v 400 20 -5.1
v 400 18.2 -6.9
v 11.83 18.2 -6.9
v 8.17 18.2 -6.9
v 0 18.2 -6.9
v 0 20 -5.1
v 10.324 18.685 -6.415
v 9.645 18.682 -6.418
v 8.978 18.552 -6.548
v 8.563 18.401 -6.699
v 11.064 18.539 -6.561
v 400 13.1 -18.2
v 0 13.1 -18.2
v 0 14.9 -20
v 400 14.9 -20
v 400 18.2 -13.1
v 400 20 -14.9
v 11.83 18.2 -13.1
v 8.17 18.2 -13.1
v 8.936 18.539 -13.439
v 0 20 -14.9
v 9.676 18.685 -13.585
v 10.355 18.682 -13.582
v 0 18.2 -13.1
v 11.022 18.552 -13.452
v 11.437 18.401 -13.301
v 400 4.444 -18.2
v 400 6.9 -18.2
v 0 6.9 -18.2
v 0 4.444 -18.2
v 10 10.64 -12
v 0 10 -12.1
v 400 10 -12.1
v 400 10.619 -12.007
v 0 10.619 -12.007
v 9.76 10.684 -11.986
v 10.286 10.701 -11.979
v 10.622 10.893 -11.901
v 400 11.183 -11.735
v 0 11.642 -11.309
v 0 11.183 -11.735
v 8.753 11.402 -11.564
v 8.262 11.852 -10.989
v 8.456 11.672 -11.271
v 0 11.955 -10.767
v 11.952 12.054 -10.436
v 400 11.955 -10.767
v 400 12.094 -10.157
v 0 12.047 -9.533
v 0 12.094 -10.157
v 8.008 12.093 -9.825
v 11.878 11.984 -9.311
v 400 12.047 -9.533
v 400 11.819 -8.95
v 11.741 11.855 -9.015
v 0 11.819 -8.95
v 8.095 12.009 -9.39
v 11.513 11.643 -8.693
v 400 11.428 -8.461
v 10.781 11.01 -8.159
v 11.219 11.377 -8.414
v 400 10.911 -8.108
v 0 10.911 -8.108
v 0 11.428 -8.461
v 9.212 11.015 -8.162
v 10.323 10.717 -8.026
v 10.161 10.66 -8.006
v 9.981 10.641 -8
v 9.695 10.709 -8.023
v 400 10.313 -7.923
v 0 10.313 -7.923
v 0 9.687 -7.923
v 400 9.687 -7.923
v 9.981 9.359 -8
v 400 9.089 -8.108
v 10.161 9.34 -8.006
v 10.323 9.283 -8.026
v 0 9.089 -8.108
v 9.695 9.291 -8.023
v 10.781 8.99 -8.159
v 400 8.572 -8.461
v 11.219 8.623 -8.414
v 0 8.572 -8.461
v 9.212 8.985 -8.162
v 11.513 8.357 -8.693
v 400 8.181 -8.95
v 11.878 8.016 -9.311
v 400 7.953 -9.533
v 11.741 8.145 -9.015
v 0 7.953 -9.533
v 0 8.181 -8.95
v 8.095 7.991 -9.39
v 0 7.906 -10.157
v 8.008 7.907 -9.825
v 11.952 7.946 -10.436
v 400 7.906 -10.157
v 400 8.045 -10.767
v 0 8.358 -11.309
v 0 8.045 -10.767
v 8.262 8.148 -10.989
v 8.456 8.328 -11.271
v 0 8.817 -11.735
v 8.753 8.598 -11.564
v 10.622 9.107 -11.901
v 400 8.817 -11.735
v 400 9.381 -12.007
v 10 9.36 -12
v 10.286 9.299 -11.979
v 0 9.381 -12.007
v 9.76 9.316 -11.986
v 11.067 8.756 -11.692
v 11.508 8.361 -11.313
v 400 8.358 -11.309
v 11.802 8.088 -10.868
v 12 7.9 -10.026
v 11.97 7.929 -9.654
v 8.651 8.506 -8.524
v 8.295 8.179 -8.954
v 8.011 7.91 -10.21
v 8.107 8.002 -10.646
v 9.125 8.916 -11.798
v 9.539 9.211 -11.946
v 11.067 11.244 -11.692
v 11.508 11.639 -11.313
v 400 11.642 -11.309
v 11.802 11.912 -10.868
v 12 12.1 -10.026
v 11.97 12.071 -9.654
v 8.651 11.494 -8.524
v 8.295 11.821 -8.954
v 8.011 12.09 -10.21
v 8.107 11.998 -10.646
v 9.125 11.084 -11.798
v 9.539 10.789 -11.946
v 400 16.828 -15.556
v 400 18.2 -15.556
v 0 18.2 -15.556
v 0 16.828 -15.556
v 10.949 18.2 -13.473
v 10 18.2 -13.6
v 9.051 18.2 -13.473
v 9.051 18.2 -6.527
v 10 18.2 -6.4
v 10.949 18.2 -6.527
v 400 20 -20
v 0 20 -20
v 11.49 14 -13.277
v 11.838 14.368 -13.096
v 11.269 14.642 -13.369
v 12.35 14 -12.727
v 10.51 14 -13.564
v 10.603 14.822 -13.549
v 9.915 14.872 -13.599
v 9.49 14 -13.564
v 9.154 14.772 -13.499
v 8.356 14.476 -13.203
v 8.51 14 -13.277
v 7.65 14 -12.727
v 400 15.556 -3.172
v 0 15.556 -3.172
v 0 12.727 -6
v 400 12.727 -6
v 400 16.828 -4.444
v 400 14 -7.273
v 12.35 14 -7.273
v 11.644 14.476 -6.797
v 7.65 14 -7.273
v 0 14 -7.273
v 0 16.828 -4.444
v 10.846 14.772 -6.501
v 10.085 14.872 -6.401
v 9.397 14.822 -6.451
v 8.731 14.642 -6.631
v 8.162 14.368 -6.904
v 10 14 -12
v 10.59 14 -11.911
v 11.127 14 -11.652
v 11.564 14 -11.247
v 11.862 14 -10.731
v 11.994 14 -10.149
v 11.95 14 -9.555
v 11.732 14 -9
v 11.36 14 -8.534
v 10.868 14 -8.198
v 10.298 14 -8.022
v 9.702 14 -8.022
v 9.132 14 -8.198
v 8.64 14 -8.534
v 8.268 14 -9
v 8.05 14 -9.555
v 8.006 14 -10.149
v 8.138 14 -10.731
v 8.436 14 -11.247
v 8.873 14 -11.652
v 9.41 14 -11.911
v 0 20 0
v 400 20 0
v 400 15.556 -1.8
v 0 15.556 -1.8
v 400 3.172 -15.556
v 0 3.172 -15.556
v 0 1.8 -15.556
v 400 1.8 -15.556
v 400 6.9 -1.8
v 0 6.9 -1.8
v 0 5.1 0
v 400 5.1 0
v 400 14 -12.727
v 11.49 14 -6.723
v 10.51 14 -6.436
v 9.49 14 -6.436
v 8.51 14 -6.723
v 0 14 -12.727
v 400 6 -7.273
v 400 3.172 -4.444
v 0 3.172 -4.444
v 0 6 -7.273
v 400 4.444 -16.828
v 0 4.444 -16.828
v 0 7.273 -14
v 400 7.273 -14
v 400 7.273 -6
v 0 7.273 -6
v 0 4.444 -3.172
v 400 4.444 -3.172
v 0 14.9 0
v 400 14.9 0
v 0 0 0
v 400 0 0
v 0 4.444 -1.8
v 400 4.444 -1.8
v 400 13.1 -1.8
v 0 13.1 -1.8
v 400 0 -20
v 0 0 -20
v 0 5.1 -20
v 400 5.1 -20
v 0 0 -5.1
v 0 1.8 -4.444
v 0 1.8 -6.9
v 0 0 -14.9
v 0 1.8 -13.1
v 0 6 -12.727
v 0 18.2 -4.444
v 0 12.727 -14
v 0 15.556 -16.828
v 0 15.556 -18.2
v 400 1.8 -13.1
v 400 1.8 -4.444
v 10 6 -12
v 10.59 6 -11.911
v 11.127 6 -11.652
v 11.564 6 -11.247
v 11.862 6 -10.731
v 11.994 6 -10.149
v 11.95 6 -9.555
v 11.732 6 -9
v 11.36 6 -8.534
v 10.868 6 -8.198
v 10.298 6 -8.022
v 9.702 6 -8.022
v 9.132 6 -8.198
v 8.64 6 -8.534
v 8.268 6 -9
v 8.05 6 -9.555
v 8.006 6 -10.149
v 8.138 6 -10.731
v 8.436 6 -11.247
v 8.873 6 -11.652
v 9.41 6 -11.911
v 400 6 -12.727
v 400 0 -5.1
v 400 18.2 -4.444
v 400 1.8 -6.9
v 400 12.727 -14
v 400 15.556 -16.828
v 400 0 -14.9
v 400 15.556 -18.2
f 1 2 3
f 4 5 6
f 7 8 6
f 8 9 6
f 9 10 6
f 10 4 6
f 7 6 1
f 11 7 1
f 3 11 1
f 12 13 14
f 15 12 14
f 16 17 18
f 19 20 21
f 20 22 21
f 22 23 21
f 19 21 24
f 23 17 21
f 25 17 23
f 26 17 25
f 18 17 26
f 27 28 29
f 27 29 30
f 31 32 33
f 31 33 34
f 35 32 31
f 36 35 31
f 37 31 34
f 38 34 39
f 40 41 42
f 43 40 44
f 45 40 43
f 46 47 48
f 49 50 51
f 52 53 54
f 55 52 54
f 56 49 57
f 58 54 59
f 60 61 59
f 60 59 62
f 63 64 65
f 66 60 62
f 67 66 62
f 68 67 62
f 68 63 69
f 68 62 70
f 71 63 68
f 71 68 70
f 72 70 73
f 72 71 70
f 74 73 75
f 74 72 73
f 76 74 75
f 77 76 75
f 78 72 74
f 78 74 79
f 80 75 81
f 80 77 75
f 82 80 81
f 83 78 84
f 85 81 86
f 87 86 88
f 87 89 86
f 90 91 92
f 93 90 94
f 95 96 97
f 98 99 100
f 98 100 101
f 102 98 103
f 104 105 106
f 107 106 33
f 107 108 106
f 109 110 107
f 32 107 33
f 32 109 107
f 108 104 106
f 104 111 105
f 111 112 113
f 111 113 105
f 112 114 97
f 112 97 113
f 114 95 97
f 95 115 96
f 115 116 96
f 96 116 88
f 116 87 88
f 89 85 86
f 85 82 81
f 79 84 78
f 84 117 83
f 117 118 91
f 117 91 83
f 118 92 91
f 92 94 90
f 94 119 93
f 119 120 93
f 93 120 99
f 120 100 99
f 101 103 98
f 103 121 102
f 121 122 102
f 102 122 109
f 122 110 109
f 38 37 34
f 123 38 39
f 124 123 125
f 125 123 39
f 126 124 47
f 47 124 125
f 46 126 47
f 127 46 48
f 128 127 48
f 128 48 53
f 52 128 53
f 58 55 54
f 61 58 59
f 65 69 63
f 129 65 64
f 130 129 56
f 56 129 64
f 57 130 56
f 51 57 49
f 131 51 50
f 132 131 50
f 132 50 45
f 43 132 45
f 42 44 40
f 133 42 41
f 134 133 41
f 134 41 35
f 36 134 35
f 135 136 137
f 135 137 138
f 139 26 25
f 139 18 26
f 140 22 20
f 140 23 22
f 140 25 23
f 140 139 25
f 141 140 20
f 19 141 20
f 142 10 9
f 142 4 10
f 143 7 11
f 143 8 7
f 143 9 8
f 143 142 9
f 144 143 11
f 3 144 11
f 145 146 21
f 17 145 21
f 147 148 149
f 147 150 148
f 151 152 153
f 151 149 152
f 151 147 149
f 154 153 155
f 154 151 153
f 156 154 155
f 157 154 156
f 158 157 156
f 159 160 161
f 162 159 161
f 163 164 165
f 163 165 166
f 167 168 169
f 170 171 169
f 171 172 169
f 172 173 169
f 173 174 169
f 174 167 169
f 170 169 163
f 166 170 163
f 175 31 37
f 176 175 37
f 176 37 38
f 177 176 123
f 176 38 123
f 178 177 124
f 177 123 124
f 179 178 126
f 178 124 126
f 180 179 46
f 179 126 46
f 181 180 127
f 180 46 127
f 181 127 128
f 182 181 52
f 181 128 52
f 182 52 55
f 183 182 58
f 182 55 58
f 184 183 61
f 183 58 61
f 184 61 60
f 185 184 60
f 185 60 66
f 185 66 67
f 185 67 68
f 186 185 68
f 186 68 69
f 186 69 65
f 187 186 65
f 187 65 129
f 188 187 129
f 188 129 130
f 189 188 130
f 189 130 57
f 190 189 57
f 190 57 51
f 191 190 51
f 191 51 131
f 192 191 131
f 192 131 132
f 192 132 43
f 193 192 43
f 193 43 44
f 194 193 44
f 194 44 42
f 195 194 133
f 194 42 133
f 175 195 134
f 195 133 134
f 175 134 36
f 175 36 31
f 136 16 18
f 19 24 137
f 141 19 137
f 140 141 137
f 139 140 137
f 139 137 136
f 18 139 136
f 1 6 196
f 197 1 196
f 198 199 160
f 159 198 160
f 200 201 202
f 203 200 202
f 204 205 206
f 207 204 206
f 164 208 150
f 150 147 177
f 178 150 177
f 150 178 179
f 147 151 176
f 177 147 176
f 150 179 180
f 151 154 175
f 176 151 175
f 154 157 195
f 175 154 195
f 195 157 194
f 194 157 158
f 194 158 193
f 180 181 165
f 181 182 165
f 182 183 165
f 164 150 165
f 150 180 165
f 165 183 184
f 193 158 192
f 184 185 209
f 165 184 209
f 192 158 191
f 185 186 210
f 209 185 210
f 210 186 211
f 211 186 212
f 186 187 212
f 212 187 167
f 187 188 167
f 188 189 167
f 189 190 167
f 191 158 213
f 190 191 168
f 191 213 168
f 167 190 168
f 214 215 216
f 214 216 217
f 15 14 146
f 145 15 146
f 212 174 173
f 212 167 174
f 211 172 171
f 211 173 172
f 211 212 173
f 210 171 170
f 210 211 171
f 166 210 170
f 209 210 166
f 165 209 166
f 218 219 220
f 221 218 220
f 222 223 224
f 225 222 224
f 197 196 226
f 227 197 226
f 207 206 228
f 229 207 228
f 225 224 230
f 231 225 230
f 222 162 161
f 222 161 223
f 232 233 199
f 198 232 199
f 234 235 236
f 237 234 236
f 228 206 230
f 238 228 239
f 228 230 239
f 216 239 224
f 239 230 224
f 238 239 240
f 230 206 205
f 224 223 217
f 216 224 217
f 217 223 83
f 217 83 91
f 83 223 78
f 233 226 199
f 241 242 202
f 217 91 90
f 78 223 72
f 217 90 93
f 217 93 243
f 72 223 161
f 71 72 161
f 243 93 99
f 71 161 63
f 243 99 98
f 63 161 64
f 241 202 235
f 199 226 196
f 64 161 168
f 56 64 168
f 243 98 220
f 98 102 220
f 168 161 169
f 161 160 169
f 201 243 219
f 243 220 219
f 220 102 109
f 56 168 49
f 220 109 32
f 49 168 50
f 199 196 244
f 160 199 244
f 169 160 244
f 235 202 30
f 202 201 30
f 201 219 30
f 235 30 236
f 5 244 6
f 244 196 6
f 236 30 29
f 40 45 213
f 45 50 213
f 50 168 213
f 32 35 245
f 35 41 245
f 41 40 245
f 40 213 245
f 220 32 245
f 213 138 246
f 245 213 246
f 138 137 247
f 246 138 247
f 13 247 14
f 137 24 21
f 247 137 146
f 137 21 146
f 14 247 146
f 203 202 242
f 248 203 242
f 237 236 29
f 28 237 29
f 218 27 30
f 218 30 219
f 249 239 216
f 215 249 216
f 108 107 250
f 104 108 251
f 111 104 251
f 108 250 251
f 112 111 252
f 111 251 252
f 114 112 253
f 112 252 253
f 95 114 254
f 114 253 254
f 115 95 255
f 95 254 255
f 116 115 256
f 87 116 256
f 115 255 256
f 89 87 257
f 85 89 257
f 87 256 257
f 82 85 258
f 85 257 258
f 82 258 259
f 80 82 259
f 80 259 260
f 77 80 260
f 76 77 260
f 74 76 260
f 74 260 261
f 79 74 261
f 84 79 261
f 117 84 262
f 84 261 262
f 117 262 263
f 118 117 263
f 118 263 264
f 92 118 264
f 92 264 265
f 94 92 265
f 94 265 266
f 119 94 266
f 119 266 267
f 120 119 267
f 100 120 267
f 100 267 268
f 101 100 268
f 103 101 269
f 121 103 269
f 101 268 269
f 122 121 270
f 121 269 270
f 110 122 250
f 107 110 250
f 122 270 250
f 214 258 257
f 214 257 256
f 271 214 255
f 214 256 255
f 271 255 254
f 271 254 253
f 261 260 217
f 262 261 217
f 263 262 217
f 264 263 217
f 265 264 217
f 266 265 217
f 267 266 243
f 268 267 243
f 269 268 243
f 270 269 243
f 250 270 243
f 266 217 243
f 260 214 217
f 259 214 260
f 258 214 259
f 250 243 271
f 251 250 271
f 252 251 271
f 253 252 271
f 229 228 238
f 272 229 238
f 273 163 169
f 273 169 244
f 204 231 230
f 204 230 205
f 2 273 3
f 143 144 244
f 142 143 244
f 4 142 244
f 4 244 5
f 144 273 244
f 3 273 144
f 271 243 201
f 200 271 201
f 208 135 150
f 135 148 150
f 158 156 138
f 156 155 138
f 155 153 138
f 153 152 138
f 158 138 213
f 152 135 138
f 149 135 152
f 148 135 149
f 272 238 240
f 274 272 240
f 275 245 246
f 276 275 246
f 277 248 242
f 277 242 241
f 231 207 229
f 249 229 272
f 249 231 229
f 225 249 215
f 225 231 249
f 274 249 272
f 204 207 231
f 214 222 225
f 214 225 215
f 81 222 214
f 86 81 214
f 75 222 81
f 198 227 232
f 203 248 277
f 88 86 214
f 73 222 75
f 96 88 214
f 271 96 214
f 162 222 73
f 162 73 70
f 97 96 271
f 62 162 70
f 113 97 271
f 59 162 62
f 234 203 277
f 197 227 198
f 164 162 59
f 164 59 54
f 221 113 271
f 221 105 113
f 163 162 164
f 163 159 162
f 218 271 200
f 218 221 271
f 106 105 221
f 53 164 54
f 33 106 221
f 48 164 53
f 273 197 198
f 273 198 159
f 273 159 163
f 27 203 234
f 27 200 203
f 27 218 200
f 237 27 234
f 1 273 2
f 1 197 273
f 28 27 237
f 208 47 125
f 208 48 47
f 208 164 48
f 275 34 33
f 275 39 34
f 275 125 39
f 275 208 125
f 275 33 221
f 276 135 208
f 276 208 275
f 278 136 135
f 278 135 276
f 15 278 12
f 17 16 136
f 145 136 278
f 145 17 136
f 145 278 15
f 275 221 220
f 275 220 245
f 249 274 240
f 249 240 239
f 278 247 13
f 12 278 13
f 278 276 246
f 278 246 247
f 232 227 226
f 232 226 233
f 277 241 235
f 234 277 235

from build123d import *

# Parameters (mm, degrees)
SKETCH1_R           = 2.1
BOSS_EXTRUDE1_DEPTH = 400
SKETCH2_R           = 2
CUT_EXTRUDE1_DEPTH  = 10
SKETCH3_R           = 3.6
CUT_EXTRUDE2_DEPTH  = 13


with BuildPart() as part:
    # Sketch1 → Boss-Extrude1 (new body)
    with BuildSketch(Plane(origin=(0, 0, 0), x_dir=(0, 0, -1), z_dir=(1, 0, 0))):
        Polygon((6, 12.727207794), (6, 7.272792206), (3.171572875, 4.444365081), (1.8, 4.444365081), (1.8, 6.9), (0, 5.1), (0, 0), (5.1, 0), (6.9, 1.8), (4.444365081, 1.8), (4.444365081, 3.171572875), (7.272792206, 6), (12.727207794, 6), (15.555634919, 3.171572875), (15.555634919, 1.8), (13.1, 1.8), (14.9, 0), (20, 0), (20, 5.1), (18.2, 6.9), (18.2, 4.444365081), (16.828427125, 4.444365081), (14, 7.272792206), (14, 12.727207794), (16.828427125, 15.555634919), (18.2, 15.555634919), (18.2, 13.1), (20, 14.9), (20, 20), (14.9, 20), (13.1, 18.2), (15.555634919, 18.2), (15.555634919, 16.828427125), (12.727207794, 14), (7.272792206, 14), (4.444365081, 16.828427125), (4.444365081, 18.2), (6.9, 18.2), (5.1, 20), (0, 20), (0, 14.9), (1.8, 13.1), (1.8, 15.555634919), (3.171572875, 15.555634919), align=None)
        with Locations((10, 10)):
            Circle(SKETCH1_R, mode=Mode.SUBTRACT)
    extrude(amount=BOSS_EXTRUDE1_DEPTH)

    # Sketch2 → Cut-Extrude1 (cut)
    with BuildSketch(Plane.XZ.offset(-6)):
        with Locations(Location((10, -10, 0), (0, 0, 270))):
            Circle(SKETCH2_R)
    extrude(amount=-CUT_EXTRUDE1_DEPTH, mode=Mode.SUBTRACT)

    # Sketch3 → Cut-Extrude2 (cut)
    with BuildSketch(Plane(origin=(0, 14, 0), x_dir=(1, 0, 0), z_dir=(0, 1, 0))):
        with Locations((10, 10)):
            Circle(SKETCH3_R)
    extrude(amount=CUT_EXTRUDE2_DEPTH, mode=Mode.SUBTRACT)


solid = part.part
